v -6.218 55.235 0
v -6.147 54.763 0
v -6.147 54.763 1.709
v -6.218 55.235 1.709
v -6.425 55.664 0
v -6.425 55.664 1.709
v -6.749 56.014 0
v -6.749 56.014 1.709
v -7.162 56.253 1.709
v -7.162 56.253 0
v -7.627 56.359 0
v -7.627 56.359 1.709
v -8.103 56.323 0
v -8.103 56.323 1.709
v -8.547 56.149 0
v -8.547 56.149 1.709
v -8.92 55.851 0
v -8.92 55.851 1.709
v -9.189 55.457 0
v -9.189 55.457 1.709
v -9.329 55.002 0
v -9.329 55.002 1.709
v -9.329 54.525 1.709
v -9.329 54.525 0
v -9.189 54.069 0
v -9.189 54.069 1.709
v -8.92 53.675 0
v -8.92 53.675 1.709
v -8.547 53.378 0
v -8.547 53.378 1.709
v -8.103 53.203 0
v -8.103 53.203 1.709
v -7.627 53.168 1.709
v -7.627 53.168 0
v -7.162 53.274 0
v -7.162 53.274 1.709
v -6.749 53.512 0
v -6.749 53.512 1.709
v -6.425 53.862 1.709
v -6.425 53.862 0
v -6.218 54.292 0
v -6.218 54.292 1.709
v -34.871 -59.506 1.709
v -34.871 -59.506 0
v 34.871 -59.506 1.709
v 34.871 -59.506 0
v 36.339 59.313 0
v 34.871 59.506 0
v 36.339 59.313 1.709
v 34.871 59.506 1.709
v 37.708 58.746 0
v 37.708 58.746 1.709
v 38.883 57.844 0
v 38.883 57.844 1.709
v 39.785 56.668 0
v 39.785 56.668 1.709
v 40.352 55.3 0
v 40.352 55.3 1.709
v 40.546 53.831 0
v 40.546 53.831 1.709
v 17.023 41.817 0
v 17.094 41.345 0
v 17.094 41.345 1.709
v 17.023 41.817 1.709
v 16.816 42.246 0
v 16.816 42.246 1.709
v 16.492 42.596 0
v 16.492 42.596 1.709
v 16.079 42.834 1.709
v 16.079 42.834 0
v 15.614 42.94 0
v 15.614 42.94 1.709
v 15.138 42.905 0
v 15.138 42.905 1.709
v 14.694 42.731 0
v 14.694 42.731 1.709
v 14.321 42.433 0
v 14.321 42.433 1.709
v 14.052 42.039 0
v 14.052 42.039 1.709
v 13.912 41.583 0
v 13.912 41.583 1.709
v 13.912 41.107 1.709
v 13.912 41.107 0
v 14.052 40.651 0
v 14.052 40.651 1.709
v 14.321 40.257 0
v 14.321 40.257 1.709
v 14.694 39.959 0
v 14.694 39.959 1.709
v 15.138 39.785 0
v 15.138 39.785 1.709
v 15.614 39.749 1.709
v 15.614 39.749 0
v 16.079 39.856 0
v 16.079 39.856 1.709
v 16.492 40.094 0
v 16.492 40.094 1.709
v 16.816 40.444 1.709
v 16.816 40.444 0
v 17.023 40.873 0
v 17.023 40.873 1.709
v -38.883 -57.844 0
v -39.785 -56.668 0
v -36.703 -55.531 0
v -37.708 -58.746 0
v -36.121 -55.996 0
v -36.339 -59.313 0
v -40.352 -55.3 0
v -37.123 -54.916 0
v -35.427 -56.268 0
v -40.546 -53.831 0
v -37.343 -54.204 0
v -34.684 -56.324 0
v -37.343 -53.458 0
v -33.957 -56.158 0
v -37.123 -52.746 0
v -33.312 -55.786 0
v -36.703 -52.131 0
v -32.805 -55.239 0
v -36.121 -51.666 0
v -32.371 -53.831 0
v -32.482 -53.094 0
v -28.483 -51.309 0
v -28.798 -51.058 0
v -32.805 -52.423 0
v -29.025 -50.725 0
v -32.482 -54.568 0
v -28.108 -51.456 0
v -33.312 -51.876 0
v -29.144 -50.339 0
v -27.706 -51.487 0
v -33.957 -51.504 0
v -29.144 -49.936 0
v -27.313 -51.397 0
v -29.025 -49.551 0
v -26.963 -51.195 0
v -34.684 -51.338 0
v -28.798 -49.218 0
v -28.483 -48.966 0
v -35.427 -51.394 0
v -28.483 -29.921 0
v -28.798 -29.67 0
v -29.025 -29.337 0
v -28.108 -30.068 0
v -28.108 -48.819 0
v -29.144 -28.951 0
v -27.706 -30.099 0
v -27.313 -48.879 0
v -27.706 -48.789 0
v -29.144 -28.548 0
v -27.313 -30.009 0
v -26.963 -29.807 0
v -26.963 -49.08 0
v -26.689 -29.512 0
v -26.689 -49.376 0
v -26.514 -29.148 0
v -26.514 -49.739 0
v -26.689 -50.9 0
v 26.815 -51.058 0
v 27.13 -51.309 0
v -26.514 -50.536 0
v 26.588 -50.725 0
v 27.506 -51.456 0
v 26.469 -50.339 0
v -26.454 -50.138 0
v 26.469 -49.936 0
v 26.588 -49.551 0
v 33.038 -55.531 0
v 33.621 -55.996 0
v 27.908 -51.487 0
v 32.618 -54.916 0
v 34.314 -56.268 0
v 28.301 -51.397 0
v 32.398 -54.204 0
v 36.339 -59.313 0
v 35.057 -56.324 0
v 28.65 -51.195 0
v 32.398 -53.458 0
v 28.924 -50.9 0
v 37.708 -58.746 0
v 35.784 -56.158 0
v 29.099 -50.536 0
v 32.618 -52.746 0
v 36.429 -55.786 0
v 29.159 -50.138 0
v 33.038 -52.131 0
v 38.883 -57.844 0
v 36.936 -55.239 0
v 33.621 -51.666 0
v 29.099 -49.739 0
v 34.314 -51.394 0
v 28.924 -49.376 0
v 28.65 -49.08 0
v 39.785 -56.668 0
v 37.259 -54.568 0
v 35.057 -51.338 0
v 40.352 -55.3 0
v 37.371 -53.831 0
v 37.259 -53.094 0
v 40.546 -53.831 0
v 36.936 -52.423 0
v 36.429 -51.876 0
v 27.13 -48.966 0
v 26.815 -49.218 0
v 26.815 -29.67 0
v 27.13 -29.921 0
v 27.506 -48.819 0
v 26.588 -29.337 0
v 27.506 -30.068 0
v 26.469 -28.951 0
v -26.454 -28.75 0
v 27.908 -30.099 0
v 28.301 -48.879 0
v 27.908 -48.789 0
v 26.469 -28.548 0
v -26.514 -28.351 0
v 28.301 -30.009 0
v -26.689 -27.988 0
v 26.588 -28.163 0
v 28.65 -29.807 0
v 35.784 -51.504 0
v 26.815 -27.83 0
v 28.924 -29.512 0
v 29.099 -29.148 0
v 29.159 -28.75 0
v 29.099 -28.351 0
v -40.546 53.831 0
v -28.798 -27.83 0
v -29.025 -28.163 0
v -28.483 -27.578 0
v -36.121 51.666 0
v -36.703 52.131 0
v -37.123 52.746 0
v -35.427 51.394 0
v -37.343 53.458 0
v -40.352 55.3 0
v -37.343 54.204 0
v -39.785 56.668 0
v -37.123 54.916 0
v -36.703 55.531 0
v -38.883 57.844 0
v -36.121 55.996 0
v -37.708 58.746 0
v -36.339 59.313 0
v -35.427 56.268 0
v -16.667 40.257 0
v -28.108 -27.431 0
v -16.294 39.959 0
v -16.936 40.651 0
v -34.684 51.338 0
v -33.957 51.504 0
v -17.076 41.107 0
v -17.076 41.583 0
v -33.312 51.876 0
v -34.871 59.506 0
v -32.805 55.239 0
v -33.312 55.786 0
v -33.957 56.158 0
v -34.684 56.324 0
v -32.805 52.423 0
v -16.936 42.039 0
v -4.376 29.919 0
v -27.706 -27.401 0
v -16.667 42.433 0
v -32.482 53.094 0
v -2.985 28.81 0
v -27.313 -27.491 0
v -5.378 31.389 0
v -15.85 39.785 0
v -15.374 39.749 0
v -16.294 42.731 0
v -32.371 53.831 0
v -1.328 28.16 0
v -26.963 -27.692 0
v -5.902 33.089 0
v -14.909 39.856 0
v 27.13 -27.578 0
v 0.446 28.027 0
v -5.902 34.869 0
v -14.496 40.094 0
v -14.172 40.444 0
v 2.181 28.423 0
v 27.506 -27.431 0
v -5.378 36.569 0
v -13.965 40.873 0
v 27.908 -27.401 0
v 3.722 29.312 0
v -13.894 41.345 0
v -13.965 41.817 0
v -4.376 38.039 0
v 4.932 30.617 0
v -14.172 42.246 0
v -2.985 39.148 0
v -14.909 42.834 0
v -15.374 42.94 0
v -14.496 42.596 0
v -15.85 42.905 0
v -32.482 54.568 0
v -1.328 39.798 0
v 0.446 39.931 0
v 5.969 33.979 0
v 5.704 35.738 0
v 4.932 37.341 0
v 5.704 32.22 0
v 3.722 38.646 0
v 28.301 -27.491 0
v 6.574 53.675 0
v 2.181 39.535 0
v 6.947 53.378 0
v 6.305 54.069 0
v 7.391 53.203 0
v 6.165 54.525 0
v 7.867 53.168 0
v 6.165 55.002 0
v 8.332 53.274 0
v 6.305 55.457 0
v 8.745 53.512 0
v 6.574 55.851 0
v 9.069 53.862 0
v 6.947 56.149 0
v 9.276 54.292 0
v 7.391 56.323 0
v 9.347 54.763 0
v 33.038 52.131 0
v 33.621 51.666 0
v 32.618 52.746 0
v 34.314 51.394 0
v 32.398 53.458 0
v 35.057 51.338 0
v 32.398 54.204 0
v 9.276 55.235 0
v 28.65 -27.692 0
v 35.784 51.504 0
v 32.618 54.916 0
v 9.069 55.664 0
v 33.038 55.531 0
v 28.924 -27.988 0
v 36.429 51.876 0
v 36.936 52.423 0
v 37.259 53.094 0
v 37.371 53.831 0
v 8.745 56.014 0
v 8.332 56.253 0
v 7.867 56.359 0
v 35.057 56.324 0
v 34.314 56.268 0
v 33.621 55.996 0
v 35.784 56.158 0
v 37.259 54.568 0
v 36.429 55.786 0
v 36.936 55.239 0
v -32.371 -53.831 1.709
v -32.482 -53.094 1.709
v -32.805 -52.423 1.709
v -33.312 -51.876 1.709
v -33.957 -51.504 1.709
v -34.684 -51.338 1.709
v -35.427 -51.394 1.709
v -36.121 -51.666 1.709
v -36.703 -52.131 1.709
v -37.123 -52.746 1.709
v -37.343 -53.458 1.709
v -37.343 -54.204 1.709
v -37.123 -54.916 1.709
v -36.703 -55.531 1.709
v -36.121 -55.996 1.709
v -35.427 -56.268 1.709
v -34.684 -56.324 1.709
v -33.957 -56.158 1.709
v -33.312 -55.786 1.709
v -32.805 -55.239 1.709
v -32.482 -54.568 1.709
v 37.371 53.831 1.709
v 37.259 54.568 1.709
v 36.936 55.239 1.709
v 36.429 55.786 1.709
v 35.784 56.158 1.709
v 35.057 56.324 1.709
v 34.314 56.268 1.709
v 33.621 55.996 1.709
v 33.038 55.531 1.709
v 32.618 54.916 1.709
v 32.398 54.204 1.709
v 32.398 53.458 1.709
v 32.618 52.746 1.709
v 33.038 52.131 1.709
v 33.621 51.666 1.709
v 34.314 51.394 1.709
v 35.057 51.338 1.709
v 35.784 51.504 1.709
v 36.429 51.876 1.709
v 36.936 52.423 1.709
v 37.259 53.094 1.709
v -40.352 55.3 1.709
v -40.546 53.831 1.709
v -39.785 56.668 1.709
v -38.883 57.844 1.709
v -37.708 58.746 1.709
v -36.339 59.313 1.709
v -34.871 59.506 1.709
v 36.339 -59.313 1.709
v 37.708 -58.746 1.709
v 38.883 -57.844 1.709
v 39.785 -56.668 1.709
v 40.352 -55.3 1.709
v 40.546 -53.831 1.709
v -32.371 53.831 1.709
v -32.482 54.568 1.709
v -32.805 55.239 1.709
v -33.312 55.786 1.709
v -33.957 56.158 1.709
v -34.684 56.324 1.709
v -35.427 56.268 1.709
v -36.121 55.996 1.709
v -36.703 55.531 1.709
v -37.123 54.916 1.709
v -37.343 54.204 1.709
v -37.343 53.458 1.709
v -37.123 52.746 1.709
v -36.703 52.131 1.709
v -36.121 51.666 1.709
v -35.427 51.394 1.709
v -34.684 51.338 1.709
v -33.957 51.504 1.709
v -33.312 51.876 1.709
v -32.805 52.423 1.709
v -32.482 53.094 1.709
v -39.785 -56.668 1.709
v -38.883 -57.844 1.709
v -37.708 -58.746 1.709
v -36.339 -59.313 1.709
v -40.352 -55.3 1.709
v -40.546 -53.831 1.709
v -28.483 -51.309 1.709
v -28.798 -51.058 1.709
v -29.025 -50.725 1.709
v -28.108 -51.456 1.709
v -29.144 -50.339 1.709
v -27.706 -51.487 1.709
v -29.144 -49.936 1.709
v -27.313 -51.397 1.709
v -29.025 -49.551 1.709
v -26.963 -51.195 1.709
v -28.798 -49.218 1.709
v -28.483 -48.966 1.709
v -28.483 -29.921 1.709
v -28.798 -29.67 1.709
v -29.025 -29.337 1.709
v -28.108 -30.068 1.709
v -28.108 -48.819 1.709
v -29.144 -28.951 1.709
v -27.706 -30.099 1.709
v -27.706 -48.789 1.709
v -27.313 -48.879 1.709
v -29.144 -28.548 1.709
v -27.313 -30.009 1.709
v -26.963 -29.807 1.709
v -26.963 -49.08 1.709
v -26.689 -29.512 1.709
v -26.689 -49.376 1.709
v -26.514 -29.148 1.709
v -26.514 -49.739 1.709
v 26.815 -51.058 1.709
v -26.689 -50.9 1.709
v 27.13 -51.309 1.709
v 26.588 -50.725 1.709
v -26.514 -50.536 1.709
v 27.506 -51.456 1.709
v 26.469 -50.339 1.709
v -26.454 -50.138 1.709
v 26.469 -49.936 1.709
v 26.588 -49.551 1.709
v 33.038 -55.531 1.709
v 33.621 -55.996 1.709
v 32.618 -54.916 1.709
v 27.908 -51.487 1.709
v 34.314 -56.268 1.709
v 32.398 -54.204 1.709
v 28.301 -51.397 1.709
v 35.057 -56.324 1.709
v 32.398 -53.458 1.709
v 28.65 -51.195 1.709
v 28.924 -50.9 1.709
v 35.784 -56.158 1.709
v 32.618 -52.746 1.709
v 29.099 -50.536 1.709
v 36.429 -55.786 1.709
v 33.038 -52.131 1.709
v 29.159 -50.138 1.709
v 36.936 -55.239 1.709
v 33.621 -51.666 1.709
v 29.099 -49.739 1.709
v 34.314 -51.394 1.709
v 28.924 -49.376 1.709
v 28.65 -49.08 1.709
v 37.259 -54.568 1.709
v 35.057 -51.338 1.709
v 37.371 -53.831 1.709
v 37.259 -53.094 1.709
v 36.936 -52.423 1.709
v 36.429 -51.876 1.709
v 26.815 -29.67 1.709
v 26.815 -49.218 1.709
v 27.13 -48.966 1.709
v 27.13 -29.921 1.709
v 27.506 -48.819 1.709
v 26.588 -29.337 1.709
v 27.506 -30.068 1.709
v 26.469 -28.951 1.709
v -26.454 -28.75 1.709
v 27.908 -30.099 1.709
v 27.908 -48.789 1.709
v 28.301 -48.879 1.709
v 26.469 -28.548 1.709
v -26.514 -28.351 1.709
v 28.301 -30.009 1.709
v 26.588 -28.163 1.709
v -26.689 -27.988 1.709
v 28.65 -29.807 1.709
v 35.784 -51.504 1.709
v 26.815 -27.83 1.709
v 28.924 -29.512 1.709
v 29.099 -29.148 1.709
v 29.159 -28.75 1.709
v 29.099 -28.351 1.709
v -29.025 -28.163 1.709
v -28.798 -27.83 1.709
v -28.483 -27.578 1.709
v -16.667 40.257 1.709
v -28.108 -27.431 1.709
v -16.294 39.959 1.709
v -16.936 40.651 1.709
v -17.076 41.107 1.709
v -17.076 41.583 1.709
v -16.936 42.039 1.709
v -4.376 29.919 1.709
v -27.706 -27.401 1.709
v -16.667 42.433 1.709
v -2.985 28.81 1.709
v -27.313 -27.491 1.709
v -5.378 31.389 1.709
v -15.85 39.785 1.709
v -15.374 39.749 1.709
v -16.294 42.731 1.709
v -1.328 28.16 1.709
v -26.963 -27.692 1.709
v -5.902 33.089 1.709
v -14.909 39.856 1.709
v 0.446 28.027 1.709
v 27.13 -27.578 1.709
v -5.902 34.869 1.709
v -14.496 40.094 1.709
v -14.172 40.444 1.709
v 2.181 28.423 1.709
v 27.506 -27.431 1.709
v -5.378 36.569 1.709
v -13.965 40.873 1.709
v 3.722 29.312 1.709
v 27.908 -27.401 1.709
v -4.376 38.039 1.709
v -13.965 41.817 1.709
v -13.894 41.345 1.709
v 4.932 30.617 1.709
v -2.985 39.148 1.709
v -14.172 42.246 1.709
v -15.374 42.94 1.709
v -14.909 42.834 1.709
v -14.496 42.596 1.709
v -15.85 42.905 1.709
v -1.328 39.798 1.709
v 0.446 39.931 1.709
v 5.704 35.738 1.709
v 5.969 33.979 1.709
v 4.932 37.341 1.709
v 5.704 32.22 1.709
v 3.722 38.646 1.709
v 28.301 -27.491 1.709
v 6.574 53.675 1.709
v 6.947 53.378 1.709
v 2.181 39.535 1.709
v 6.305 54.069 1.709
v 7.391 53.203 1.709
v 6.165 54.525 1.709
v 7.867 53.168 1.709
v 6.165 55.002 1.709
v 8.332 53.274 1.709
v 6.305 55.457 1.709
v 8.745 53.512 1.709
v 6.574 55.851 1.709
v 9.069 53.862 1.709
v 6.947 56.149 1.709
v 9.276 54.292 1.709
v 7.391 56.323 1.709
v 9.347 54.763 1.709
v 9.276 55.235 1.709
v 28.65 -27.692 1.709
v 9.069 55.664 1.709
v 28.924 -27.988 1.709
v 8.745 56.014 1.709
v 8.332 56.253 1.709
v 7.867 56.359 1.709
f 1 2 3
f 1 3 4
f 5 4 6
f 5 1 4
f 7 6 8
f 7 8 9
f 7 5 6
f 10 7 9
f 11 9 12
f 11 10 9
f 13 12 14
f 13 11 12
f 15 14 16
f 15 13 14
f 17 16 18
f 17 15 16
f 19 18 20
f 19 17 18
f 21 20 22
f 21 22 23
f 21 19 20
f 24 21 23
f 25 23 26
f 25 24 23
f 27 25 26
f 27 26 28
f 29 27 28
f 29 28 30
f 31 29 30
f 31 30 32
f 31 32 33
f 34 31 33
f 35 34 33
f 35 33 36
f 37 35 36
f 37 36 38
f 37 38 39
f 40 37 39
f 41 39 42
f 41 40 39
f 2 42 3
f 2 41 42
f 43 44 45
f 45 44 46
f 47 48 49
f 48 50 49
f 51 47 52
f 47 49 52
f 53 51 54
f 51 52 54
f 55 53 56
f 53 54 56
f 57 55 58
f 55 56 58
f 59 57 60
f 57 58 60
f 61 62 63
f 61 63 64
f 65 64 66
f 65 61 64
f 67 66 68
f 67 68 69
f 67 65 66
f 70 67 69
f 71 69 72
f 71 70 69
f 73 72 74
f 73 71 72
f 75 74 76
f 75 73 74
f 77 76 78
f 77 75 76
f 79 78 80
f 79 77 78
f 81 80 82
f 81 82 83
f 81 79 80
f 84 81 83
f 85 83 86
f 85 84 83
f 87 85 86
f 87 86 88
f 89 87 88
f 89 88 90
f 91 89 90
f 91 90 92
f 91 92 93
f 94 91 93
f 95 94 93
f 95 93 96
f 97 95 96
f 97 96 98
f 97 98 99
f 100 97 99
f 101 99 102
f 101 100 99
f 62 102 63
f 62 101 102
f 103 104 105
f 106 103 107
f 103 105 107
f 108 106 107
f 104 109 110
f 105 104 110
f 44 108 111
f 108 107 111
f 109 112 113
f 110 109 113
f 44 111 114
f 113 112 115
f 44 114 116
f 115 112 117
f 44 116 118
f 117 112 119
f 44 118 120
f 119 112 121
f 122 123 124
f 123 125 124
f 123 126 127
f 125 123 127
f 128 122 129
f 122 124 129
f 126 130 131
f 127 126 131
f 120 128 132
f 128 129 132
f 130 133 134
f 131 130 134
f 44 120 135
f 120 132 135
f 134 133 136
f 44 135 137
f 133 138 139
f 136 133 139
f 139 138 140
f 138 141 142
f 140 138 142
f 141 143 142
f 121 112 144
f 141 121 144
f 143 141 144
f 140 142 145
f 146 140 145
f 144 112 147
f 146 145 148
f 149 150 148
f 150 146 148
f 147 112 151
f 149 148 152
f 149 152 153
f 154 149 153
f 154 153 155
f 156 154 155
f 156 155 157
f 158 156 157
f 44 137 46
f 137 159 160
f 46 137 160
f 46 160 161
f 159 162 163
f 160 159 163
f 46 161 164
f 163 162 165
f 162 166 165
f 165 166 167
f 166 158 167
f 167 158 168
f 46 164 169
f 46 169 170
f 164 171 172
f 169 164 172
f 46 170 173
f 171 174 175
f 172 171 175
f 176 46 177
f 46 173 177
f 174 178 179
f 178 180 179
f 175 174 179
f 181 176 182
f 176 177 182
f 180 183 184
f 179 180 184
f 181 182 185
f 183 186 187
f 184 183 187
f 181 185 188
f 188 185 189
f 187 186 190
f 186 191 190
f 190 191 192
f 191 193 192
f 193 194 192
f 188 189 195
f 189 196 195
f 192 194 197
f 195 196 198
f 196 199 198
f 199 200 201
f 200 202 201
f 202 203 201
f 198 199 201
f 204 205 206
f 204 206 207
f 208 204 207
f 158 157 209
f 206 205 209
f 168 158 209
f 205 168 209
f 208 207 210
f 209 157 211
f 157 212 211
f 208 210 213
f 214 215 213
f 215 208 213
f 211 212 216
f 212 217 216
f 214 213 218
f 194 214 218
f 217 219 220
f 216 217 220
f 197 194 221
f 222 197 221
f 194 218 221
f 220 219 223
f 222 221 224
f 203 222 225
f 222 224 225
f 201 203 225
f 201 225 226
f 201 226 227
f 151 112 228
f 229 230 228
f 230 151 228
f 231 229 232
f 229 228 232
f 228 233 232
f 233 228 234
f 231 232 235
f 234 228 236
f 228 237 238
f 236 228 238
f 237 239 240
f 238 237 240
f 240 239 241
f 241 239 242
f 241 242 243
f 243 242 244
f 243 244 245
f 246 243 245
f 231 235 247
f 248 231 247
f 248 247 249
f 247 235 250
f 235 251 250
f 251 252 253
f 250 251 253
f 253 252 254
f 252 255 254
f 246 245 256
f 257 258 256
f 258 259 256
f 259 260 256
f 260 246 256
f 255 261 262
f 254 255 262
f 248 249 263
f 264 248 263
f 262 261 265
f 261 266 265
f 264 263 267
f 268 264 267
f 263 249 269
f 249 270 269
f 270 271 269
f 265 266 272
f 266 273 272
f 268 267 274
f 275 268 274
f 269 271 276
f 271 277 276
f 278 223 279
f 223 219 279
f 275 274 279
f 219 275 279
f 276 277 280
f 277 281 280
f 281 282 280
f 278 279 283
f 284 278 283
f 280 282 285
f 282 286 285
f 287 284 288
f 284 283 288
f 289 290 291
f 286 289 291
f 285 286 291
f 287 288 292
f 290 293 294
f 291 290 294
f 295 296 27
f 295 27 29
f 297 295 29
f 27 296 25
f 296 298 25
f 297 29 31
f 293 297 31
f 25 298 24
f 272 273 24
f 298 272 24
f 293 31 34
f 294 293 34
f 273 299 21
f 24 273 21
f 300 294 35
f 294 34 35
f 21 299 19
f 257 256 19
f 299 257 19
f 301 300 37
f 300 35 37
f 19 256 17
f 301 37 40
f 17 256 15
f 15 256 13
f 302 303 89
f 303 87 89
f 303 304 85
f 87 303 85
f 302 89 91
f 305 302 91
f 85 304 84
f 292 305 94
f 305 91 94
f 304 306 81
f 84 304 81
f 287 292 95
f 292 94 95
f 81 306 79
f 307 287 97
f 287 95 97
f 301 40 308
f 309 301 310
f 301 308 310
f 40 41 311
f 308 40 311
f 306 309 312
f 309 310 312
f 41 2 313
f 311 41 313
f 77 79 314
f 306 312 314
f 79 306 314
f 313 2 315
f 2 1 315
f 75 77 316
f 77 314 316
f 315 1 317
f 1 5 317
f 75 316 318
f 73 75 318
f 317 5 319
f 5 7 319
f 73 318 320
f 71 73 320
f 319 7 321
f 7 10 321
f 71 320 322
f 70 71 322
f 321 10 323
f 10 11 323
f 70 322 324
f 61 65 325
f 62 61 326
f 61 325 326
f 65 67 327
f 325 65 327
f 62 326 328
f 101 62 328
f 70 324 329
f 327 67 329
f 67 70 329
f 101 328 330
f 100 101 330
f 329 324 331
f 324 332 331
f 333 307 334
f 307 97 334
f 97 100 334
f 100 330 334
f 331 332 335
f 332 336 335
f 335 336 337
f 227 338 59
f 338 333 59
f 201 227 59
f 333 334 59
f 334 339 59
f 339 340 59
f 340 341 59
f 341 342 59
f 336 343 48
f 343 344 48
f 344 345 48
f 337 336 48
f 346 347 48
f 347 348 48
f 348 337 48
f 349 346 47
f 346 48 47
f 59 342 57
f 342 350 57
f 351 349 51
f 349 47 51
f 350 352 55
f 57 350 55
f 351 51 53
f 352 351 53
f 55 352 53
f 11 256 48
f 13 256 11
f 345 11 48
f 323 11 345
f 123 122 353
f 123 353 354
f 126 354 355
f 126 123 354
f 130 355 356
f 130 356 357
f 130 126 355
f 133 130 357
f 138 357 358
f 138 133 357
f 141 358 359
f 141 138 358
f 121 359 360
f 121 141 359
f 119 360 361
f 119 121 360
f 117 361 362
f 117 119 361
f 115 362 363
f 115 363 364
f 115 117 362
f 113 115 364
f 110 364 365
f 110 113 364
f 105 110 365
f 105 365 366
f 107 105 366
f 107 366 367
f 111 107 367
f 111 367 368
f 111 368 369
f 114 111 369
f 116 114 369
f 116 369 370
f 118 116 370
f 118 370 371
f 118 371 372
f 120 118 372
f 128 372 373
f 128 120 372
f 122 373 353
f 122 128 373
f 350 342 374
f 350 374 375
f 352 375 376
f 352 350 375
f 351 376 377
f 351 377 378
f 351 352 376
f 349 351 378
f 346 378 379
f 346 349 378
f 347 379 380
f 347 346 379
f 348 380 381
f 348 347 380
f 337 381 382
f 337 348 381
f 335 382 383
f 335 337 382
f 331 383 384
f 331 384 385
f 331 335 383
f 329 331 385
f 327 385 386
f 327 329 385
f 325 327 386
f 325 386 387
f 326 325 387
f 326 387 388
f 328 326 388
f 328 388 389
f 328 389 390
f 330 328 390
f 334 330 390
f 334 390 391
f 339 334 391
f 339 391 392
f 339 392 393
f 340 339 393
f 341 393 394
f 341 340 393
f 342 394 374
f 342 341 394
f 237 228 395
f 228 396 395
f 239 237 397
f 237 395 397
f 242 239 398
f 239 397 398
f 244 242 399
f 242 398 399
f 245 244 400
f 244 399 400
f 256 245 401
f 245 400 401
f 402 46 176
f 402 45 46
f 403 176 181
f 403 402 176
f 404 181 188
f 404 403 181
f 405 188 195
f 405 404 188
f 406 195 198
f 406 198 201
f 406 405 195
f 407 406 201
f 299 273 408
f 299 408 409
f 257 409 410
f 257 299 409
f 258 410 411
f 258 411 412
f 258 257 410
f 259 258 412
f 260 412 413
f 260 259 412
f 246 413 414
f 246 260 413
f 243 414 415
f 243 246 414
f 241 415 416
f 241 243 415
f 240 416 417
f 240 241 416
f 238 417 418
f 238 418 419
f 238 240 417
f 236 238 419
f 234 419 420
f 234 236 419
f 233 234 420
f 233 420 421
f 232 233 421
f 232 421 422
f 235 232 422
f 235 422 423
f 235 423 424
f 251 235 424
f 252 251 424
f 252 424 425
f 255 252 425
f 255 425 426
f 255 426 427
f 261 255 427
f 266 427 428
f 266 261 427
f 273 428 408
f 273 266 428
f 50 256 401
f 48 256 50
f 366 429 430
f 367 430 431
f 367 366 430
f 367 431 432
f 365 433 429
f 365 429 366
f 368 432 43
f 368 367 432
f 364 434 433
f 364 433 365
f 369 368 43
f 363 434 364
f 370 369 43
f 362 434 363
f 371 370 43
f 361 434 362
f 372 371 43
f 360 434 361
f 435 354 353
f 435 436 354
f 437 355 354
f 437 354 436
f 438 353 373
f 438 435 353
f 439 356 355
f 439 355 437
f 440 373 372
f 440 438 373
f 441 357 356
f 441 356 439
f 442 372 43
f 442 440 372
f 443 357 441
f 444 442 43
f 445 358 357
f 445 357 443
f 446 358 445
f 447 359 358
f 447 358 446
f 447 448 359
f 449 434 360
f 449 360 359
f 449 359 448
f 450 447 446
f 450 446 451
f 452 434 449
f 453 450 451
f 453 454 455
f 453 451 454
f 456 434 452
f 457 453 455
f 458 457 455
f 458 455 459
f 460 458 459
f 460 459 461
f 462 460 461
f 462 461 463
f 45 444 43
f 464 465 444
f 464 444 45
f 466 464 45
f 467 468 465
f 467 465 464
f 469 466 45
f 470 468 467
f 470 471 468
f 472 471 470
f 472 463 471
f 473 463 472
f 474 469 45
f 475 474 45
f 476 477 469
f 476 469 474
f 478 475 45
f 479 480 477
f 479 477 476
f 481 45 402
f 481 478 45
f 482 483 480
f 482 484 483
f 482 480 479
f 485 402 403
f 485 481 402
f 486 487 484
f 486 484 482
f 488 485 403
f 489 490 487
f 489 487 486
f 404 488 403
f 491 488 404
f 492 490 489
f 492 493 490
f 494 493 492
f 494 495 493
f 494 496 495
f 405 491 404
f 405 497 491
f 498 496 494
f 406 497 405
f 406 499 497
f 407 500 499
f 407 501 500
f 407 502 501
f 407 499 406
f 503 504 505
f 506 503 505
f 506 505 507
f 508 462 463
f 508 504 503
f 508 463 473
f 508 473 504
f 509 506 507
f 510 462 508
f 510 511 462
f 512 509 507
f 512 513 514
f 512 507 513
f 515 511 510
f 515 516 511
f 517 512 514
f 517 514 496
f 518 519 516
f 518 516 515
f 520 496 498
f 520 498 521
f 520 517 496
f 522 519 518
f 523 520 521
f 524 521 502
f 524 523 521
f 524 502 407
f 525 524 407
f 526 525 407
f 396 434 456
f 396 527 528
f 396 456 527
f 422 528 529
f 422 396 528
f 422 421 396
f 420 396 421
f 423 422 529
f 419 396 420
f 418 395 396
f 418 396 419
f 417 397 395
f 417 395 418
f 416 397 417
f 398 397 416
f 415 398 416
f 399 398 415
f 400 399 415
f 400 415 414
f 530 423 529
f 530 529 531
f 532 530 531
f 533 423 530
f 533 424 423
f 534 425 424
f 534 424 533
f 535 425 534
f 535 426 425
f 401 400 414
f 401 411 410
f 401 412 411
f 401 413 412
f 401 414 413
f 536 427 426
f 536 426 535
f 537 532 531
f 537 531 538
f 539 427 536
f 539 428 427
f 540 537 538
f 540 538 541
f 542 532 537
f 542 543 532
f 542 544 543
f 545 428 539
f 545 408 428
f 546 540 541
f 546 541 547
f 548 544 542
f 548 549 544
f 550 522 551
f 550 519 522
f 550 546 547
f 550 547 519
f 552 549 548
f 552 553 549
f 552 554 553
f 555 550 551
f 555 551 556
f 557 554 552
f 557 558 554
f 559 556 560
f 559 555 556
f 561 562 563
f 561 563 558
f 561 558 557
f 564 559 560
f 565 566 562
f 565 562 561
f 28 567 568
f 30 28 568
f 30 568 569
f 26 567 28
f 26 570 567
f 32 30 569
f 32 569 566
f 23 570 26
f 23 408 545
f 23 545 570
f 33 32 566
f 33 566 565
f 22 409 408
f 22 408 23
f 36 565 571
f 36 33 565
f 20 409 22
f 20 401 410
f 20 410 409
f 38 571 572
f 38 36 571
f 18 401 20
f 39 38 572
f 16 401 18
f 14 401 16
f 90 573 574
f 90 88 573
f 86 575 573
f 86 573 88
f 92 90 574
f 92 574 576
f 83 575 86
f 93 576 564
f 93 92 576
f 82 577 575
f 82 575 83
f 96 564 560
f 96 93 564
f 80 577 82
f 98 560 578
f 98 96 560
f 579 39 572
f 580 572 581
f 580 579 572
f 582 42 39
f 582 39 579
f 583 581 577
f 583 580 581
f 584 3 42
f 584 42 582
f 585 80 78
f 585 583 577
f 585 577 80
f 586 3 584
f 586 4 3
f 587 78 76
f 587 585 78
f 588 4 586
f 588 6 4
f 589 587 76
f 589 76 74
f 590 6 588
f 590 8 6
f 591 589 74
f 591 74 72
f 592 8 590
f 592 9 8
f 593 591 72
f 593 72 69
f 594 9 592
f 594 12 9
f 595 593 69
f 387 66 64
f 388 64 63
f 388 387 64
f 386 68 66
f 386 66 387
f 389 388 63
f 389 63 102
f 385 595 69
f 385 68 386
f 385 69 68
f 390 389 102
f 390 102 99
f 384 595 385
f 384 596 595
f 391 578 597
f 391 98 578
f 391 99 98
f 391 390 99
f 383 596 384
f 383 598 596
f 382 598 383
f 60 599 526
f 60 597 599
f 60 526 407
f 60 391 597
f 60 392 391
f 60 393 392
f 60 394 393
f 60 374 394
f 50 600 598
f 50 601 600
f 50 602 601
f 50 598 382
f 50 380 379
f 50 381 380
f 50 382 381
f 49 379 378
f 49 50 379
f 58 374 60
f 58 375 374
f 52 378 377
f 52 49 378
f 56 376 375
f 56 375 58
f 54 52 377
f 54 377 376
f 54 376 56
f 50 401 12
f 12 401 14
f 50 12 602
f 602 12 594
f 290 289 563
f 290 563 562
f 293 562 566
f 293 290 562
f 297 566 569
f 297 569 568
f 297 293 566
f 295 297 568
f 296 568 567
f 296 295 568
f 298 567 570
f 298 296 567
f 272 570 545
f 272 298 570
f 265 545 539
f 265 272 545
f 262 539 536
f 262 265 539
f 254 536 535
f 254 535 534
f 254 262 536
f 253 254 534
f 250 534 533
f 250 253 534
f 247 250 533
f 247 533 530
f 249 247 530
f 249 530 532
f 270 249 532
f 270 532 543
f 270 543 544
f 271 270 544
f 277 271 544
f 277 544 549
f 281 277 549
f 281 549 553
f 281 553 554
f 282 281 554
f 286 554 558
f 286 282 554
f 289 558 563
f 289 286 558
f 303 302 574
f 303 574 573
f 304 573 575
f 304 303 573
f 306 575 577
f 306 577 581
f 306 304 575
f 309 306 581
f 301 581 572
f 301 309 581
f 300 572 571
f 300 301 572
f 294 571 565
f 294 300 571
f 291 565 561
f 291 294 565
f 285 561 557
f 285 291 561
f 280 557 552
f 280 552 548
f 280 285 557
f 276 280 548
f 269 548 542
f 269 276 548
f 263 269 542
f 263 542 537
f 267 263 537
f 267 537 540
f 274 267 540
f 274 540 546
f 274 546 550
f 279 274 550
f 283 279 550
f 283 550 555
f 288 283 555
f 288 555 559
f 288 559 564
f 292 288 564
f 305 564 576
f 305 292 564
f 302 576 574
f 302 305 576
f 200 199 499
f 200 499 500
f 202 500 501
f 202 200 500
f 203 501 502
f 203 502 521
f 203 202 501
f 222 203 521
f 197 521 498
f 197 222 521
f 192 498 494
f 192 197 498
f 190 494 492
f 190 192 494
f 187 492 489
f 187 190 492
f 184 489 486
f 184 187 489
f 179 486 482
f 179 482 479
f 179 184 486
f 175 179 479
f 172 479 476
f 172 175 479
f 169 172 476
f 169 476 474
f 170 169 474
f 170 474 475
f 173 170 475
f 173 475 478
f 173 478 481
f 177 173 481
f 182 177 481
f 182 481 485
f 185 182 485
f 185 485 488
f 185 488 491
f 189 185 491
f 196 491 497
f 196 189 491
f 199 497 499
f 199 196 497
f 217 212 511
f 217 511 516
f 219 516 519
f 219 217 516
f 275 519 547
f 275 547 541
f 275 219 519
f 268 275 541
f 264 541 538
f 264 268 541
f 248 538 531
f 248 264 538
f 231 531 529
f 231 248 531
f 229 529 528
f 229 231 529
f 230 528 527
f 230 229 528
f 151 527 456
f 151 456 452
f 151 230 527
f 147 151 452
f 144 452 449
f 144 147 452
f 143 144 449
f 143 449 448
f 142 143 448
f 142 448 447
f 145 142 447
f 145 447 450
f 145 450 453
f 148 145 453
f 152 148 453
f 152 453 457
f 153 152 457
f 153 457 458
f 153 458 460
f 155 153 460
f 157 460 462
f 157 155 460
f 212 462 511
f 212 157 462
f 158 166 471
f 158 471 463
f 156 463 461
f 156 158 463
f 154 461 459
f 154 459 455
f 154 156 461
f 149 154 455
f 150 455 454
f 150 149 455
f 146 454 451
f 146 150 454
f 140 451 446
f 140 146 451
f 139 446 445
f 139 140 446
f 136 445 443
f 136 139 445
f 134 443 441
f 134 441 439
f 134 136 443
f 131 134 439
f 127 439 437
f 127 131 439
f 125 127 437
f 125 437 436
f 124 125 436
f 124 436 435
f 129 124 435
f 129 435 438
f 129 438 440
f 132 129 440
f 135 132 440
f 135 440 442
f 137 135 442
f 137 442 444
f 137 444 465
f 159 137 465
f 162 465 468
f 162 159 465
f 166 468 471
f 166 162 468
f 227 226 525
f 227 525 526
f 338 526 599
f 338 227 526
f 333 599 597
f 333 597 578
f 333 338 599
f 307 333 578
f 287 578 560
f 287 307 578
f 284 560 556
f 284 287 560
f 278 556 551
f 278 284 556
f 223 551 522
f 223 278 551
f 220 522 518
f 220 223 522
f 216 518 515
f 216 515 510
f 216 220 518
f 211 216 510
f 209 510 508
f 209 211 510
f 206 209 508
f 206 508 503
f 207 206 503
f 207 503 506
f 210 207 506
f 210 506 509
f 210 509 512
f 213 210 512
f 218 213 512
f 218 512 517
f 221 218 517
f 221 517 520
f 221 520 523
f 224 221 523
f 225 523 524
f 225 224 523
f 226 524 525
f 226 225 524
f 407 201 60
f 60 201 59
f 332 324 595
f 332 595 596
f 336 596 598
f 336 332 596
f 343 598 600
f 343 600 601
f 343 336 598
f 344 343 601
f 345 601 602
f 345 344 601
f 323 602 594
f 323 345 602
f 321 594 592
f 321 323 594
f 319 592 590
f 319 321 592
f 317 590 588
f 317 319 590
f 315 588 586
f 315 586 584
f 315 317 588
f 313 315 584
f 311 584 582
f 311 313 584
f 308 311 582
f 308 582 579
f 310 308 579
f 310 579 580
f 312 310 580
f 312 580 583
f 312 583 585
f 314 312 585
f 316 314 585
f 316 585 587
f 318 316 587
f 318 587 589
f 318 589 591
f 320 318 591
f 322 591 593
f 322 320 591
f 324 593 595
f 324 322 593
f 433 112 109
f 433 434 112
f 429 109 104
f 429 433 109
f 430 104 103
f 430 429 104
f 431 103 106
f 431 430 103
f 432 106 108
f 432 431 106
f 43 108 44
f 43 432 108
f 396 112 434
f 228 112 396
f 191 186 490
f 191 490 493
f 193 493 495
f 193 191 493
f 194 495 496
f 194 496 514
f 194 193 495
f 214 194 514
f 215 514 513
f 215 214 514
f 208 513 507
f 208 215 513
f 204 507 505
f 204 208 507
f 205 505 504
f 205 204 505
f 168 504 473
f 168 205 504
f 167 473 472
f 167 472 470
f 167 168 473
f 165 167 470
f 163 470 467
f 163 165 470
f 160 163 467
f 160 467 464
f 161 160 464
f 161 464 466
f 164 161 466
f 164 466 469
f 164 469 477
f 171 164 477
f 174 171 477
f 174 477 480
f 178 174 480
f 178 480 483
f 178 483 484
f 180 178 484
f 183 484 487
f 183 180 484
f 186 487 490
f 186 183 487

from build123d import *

# Parameters (mm, degrees)
F0_W     = 81.09111
F0_H     = 119.011938
F0_R     = 2.5
F0_R_2   = 1.35255
F0_R_3   = 1.6
F0_R_4   = 5.969
F1_DEPTH = 1.70942
F2_R     = 5.674995


with BuildPart() as f1:
    # F0 (on Top) → F1 (new body)
    with BuildSketch(Plane.XY):
        Rectangle(F0_W, F0_H)
        with Locations((-34.870555, -53.830969)):
            Circle(F0_R, mode=Mode.SUBTRACT)
        with Locations((-27.80665, -50.137809)):
            Circle(F0_R_2, mode=Mode.SUBTRACT)
        with Locations((-27.80665, -28.749815)):
            Circle(F0_R_2, mode=Mode.SUBTRACT)
        with Locations((27.80665, -50.137809)):
            Circle(F0_R_2, mode=Mode.SUBTRACT)
        with Locations((34.870555, -53.830969)):
            Circle(F0_R, mode=Mode.SUBTRACT)
        with Locations((27.80665, -28.749815)):
            Circle(F0_R_2, mode=Mode.SUBTRACT)
        with Locations((-34.870555, 53.830969)):
            Circle(F0_R, mode=Mode.SUBTRACT)
        with Locations((-15.494, 41.344969)):
            Circle(F0_R_3, mode=Mode.SUBTRACT)
        with Locations((-7.747, 54.763167)):
            Circle(F0_R_3, mode=Mode.SUBTRACT)
        with Locations((0, 33.978969)):
            Circle(F0_R_4, mode=Mode.SUBTRACT)
        with Locations((15.494, 41.344969)):
            Circle(F0_R_3, mode=Mode.SUBTRACT)
        with Locations((7.747, 54.763167)):
            Circle(F0_R_3, mode=Mode.SUBTRACT)
        with Locations((34.870555, 53.830969)):
            Circle(F0_R, mode=Mode.SUBTRACT)
    extrude(amount=F1_DEPTH)

    # F2
    f2_edges = [f1.edges().sort_by_distance(p)[0] for p in [
        (40.545555, 59.505969, 0.85471),
        (40.545555, -59.505969, 0.85471),
        (-40.545555, -59.505969, 0.85471),
        (-40.545555, 59.505969, 0.85471),
    ]]
    fillet(f2_edges, radius=F2_R)


solid = f1.part
